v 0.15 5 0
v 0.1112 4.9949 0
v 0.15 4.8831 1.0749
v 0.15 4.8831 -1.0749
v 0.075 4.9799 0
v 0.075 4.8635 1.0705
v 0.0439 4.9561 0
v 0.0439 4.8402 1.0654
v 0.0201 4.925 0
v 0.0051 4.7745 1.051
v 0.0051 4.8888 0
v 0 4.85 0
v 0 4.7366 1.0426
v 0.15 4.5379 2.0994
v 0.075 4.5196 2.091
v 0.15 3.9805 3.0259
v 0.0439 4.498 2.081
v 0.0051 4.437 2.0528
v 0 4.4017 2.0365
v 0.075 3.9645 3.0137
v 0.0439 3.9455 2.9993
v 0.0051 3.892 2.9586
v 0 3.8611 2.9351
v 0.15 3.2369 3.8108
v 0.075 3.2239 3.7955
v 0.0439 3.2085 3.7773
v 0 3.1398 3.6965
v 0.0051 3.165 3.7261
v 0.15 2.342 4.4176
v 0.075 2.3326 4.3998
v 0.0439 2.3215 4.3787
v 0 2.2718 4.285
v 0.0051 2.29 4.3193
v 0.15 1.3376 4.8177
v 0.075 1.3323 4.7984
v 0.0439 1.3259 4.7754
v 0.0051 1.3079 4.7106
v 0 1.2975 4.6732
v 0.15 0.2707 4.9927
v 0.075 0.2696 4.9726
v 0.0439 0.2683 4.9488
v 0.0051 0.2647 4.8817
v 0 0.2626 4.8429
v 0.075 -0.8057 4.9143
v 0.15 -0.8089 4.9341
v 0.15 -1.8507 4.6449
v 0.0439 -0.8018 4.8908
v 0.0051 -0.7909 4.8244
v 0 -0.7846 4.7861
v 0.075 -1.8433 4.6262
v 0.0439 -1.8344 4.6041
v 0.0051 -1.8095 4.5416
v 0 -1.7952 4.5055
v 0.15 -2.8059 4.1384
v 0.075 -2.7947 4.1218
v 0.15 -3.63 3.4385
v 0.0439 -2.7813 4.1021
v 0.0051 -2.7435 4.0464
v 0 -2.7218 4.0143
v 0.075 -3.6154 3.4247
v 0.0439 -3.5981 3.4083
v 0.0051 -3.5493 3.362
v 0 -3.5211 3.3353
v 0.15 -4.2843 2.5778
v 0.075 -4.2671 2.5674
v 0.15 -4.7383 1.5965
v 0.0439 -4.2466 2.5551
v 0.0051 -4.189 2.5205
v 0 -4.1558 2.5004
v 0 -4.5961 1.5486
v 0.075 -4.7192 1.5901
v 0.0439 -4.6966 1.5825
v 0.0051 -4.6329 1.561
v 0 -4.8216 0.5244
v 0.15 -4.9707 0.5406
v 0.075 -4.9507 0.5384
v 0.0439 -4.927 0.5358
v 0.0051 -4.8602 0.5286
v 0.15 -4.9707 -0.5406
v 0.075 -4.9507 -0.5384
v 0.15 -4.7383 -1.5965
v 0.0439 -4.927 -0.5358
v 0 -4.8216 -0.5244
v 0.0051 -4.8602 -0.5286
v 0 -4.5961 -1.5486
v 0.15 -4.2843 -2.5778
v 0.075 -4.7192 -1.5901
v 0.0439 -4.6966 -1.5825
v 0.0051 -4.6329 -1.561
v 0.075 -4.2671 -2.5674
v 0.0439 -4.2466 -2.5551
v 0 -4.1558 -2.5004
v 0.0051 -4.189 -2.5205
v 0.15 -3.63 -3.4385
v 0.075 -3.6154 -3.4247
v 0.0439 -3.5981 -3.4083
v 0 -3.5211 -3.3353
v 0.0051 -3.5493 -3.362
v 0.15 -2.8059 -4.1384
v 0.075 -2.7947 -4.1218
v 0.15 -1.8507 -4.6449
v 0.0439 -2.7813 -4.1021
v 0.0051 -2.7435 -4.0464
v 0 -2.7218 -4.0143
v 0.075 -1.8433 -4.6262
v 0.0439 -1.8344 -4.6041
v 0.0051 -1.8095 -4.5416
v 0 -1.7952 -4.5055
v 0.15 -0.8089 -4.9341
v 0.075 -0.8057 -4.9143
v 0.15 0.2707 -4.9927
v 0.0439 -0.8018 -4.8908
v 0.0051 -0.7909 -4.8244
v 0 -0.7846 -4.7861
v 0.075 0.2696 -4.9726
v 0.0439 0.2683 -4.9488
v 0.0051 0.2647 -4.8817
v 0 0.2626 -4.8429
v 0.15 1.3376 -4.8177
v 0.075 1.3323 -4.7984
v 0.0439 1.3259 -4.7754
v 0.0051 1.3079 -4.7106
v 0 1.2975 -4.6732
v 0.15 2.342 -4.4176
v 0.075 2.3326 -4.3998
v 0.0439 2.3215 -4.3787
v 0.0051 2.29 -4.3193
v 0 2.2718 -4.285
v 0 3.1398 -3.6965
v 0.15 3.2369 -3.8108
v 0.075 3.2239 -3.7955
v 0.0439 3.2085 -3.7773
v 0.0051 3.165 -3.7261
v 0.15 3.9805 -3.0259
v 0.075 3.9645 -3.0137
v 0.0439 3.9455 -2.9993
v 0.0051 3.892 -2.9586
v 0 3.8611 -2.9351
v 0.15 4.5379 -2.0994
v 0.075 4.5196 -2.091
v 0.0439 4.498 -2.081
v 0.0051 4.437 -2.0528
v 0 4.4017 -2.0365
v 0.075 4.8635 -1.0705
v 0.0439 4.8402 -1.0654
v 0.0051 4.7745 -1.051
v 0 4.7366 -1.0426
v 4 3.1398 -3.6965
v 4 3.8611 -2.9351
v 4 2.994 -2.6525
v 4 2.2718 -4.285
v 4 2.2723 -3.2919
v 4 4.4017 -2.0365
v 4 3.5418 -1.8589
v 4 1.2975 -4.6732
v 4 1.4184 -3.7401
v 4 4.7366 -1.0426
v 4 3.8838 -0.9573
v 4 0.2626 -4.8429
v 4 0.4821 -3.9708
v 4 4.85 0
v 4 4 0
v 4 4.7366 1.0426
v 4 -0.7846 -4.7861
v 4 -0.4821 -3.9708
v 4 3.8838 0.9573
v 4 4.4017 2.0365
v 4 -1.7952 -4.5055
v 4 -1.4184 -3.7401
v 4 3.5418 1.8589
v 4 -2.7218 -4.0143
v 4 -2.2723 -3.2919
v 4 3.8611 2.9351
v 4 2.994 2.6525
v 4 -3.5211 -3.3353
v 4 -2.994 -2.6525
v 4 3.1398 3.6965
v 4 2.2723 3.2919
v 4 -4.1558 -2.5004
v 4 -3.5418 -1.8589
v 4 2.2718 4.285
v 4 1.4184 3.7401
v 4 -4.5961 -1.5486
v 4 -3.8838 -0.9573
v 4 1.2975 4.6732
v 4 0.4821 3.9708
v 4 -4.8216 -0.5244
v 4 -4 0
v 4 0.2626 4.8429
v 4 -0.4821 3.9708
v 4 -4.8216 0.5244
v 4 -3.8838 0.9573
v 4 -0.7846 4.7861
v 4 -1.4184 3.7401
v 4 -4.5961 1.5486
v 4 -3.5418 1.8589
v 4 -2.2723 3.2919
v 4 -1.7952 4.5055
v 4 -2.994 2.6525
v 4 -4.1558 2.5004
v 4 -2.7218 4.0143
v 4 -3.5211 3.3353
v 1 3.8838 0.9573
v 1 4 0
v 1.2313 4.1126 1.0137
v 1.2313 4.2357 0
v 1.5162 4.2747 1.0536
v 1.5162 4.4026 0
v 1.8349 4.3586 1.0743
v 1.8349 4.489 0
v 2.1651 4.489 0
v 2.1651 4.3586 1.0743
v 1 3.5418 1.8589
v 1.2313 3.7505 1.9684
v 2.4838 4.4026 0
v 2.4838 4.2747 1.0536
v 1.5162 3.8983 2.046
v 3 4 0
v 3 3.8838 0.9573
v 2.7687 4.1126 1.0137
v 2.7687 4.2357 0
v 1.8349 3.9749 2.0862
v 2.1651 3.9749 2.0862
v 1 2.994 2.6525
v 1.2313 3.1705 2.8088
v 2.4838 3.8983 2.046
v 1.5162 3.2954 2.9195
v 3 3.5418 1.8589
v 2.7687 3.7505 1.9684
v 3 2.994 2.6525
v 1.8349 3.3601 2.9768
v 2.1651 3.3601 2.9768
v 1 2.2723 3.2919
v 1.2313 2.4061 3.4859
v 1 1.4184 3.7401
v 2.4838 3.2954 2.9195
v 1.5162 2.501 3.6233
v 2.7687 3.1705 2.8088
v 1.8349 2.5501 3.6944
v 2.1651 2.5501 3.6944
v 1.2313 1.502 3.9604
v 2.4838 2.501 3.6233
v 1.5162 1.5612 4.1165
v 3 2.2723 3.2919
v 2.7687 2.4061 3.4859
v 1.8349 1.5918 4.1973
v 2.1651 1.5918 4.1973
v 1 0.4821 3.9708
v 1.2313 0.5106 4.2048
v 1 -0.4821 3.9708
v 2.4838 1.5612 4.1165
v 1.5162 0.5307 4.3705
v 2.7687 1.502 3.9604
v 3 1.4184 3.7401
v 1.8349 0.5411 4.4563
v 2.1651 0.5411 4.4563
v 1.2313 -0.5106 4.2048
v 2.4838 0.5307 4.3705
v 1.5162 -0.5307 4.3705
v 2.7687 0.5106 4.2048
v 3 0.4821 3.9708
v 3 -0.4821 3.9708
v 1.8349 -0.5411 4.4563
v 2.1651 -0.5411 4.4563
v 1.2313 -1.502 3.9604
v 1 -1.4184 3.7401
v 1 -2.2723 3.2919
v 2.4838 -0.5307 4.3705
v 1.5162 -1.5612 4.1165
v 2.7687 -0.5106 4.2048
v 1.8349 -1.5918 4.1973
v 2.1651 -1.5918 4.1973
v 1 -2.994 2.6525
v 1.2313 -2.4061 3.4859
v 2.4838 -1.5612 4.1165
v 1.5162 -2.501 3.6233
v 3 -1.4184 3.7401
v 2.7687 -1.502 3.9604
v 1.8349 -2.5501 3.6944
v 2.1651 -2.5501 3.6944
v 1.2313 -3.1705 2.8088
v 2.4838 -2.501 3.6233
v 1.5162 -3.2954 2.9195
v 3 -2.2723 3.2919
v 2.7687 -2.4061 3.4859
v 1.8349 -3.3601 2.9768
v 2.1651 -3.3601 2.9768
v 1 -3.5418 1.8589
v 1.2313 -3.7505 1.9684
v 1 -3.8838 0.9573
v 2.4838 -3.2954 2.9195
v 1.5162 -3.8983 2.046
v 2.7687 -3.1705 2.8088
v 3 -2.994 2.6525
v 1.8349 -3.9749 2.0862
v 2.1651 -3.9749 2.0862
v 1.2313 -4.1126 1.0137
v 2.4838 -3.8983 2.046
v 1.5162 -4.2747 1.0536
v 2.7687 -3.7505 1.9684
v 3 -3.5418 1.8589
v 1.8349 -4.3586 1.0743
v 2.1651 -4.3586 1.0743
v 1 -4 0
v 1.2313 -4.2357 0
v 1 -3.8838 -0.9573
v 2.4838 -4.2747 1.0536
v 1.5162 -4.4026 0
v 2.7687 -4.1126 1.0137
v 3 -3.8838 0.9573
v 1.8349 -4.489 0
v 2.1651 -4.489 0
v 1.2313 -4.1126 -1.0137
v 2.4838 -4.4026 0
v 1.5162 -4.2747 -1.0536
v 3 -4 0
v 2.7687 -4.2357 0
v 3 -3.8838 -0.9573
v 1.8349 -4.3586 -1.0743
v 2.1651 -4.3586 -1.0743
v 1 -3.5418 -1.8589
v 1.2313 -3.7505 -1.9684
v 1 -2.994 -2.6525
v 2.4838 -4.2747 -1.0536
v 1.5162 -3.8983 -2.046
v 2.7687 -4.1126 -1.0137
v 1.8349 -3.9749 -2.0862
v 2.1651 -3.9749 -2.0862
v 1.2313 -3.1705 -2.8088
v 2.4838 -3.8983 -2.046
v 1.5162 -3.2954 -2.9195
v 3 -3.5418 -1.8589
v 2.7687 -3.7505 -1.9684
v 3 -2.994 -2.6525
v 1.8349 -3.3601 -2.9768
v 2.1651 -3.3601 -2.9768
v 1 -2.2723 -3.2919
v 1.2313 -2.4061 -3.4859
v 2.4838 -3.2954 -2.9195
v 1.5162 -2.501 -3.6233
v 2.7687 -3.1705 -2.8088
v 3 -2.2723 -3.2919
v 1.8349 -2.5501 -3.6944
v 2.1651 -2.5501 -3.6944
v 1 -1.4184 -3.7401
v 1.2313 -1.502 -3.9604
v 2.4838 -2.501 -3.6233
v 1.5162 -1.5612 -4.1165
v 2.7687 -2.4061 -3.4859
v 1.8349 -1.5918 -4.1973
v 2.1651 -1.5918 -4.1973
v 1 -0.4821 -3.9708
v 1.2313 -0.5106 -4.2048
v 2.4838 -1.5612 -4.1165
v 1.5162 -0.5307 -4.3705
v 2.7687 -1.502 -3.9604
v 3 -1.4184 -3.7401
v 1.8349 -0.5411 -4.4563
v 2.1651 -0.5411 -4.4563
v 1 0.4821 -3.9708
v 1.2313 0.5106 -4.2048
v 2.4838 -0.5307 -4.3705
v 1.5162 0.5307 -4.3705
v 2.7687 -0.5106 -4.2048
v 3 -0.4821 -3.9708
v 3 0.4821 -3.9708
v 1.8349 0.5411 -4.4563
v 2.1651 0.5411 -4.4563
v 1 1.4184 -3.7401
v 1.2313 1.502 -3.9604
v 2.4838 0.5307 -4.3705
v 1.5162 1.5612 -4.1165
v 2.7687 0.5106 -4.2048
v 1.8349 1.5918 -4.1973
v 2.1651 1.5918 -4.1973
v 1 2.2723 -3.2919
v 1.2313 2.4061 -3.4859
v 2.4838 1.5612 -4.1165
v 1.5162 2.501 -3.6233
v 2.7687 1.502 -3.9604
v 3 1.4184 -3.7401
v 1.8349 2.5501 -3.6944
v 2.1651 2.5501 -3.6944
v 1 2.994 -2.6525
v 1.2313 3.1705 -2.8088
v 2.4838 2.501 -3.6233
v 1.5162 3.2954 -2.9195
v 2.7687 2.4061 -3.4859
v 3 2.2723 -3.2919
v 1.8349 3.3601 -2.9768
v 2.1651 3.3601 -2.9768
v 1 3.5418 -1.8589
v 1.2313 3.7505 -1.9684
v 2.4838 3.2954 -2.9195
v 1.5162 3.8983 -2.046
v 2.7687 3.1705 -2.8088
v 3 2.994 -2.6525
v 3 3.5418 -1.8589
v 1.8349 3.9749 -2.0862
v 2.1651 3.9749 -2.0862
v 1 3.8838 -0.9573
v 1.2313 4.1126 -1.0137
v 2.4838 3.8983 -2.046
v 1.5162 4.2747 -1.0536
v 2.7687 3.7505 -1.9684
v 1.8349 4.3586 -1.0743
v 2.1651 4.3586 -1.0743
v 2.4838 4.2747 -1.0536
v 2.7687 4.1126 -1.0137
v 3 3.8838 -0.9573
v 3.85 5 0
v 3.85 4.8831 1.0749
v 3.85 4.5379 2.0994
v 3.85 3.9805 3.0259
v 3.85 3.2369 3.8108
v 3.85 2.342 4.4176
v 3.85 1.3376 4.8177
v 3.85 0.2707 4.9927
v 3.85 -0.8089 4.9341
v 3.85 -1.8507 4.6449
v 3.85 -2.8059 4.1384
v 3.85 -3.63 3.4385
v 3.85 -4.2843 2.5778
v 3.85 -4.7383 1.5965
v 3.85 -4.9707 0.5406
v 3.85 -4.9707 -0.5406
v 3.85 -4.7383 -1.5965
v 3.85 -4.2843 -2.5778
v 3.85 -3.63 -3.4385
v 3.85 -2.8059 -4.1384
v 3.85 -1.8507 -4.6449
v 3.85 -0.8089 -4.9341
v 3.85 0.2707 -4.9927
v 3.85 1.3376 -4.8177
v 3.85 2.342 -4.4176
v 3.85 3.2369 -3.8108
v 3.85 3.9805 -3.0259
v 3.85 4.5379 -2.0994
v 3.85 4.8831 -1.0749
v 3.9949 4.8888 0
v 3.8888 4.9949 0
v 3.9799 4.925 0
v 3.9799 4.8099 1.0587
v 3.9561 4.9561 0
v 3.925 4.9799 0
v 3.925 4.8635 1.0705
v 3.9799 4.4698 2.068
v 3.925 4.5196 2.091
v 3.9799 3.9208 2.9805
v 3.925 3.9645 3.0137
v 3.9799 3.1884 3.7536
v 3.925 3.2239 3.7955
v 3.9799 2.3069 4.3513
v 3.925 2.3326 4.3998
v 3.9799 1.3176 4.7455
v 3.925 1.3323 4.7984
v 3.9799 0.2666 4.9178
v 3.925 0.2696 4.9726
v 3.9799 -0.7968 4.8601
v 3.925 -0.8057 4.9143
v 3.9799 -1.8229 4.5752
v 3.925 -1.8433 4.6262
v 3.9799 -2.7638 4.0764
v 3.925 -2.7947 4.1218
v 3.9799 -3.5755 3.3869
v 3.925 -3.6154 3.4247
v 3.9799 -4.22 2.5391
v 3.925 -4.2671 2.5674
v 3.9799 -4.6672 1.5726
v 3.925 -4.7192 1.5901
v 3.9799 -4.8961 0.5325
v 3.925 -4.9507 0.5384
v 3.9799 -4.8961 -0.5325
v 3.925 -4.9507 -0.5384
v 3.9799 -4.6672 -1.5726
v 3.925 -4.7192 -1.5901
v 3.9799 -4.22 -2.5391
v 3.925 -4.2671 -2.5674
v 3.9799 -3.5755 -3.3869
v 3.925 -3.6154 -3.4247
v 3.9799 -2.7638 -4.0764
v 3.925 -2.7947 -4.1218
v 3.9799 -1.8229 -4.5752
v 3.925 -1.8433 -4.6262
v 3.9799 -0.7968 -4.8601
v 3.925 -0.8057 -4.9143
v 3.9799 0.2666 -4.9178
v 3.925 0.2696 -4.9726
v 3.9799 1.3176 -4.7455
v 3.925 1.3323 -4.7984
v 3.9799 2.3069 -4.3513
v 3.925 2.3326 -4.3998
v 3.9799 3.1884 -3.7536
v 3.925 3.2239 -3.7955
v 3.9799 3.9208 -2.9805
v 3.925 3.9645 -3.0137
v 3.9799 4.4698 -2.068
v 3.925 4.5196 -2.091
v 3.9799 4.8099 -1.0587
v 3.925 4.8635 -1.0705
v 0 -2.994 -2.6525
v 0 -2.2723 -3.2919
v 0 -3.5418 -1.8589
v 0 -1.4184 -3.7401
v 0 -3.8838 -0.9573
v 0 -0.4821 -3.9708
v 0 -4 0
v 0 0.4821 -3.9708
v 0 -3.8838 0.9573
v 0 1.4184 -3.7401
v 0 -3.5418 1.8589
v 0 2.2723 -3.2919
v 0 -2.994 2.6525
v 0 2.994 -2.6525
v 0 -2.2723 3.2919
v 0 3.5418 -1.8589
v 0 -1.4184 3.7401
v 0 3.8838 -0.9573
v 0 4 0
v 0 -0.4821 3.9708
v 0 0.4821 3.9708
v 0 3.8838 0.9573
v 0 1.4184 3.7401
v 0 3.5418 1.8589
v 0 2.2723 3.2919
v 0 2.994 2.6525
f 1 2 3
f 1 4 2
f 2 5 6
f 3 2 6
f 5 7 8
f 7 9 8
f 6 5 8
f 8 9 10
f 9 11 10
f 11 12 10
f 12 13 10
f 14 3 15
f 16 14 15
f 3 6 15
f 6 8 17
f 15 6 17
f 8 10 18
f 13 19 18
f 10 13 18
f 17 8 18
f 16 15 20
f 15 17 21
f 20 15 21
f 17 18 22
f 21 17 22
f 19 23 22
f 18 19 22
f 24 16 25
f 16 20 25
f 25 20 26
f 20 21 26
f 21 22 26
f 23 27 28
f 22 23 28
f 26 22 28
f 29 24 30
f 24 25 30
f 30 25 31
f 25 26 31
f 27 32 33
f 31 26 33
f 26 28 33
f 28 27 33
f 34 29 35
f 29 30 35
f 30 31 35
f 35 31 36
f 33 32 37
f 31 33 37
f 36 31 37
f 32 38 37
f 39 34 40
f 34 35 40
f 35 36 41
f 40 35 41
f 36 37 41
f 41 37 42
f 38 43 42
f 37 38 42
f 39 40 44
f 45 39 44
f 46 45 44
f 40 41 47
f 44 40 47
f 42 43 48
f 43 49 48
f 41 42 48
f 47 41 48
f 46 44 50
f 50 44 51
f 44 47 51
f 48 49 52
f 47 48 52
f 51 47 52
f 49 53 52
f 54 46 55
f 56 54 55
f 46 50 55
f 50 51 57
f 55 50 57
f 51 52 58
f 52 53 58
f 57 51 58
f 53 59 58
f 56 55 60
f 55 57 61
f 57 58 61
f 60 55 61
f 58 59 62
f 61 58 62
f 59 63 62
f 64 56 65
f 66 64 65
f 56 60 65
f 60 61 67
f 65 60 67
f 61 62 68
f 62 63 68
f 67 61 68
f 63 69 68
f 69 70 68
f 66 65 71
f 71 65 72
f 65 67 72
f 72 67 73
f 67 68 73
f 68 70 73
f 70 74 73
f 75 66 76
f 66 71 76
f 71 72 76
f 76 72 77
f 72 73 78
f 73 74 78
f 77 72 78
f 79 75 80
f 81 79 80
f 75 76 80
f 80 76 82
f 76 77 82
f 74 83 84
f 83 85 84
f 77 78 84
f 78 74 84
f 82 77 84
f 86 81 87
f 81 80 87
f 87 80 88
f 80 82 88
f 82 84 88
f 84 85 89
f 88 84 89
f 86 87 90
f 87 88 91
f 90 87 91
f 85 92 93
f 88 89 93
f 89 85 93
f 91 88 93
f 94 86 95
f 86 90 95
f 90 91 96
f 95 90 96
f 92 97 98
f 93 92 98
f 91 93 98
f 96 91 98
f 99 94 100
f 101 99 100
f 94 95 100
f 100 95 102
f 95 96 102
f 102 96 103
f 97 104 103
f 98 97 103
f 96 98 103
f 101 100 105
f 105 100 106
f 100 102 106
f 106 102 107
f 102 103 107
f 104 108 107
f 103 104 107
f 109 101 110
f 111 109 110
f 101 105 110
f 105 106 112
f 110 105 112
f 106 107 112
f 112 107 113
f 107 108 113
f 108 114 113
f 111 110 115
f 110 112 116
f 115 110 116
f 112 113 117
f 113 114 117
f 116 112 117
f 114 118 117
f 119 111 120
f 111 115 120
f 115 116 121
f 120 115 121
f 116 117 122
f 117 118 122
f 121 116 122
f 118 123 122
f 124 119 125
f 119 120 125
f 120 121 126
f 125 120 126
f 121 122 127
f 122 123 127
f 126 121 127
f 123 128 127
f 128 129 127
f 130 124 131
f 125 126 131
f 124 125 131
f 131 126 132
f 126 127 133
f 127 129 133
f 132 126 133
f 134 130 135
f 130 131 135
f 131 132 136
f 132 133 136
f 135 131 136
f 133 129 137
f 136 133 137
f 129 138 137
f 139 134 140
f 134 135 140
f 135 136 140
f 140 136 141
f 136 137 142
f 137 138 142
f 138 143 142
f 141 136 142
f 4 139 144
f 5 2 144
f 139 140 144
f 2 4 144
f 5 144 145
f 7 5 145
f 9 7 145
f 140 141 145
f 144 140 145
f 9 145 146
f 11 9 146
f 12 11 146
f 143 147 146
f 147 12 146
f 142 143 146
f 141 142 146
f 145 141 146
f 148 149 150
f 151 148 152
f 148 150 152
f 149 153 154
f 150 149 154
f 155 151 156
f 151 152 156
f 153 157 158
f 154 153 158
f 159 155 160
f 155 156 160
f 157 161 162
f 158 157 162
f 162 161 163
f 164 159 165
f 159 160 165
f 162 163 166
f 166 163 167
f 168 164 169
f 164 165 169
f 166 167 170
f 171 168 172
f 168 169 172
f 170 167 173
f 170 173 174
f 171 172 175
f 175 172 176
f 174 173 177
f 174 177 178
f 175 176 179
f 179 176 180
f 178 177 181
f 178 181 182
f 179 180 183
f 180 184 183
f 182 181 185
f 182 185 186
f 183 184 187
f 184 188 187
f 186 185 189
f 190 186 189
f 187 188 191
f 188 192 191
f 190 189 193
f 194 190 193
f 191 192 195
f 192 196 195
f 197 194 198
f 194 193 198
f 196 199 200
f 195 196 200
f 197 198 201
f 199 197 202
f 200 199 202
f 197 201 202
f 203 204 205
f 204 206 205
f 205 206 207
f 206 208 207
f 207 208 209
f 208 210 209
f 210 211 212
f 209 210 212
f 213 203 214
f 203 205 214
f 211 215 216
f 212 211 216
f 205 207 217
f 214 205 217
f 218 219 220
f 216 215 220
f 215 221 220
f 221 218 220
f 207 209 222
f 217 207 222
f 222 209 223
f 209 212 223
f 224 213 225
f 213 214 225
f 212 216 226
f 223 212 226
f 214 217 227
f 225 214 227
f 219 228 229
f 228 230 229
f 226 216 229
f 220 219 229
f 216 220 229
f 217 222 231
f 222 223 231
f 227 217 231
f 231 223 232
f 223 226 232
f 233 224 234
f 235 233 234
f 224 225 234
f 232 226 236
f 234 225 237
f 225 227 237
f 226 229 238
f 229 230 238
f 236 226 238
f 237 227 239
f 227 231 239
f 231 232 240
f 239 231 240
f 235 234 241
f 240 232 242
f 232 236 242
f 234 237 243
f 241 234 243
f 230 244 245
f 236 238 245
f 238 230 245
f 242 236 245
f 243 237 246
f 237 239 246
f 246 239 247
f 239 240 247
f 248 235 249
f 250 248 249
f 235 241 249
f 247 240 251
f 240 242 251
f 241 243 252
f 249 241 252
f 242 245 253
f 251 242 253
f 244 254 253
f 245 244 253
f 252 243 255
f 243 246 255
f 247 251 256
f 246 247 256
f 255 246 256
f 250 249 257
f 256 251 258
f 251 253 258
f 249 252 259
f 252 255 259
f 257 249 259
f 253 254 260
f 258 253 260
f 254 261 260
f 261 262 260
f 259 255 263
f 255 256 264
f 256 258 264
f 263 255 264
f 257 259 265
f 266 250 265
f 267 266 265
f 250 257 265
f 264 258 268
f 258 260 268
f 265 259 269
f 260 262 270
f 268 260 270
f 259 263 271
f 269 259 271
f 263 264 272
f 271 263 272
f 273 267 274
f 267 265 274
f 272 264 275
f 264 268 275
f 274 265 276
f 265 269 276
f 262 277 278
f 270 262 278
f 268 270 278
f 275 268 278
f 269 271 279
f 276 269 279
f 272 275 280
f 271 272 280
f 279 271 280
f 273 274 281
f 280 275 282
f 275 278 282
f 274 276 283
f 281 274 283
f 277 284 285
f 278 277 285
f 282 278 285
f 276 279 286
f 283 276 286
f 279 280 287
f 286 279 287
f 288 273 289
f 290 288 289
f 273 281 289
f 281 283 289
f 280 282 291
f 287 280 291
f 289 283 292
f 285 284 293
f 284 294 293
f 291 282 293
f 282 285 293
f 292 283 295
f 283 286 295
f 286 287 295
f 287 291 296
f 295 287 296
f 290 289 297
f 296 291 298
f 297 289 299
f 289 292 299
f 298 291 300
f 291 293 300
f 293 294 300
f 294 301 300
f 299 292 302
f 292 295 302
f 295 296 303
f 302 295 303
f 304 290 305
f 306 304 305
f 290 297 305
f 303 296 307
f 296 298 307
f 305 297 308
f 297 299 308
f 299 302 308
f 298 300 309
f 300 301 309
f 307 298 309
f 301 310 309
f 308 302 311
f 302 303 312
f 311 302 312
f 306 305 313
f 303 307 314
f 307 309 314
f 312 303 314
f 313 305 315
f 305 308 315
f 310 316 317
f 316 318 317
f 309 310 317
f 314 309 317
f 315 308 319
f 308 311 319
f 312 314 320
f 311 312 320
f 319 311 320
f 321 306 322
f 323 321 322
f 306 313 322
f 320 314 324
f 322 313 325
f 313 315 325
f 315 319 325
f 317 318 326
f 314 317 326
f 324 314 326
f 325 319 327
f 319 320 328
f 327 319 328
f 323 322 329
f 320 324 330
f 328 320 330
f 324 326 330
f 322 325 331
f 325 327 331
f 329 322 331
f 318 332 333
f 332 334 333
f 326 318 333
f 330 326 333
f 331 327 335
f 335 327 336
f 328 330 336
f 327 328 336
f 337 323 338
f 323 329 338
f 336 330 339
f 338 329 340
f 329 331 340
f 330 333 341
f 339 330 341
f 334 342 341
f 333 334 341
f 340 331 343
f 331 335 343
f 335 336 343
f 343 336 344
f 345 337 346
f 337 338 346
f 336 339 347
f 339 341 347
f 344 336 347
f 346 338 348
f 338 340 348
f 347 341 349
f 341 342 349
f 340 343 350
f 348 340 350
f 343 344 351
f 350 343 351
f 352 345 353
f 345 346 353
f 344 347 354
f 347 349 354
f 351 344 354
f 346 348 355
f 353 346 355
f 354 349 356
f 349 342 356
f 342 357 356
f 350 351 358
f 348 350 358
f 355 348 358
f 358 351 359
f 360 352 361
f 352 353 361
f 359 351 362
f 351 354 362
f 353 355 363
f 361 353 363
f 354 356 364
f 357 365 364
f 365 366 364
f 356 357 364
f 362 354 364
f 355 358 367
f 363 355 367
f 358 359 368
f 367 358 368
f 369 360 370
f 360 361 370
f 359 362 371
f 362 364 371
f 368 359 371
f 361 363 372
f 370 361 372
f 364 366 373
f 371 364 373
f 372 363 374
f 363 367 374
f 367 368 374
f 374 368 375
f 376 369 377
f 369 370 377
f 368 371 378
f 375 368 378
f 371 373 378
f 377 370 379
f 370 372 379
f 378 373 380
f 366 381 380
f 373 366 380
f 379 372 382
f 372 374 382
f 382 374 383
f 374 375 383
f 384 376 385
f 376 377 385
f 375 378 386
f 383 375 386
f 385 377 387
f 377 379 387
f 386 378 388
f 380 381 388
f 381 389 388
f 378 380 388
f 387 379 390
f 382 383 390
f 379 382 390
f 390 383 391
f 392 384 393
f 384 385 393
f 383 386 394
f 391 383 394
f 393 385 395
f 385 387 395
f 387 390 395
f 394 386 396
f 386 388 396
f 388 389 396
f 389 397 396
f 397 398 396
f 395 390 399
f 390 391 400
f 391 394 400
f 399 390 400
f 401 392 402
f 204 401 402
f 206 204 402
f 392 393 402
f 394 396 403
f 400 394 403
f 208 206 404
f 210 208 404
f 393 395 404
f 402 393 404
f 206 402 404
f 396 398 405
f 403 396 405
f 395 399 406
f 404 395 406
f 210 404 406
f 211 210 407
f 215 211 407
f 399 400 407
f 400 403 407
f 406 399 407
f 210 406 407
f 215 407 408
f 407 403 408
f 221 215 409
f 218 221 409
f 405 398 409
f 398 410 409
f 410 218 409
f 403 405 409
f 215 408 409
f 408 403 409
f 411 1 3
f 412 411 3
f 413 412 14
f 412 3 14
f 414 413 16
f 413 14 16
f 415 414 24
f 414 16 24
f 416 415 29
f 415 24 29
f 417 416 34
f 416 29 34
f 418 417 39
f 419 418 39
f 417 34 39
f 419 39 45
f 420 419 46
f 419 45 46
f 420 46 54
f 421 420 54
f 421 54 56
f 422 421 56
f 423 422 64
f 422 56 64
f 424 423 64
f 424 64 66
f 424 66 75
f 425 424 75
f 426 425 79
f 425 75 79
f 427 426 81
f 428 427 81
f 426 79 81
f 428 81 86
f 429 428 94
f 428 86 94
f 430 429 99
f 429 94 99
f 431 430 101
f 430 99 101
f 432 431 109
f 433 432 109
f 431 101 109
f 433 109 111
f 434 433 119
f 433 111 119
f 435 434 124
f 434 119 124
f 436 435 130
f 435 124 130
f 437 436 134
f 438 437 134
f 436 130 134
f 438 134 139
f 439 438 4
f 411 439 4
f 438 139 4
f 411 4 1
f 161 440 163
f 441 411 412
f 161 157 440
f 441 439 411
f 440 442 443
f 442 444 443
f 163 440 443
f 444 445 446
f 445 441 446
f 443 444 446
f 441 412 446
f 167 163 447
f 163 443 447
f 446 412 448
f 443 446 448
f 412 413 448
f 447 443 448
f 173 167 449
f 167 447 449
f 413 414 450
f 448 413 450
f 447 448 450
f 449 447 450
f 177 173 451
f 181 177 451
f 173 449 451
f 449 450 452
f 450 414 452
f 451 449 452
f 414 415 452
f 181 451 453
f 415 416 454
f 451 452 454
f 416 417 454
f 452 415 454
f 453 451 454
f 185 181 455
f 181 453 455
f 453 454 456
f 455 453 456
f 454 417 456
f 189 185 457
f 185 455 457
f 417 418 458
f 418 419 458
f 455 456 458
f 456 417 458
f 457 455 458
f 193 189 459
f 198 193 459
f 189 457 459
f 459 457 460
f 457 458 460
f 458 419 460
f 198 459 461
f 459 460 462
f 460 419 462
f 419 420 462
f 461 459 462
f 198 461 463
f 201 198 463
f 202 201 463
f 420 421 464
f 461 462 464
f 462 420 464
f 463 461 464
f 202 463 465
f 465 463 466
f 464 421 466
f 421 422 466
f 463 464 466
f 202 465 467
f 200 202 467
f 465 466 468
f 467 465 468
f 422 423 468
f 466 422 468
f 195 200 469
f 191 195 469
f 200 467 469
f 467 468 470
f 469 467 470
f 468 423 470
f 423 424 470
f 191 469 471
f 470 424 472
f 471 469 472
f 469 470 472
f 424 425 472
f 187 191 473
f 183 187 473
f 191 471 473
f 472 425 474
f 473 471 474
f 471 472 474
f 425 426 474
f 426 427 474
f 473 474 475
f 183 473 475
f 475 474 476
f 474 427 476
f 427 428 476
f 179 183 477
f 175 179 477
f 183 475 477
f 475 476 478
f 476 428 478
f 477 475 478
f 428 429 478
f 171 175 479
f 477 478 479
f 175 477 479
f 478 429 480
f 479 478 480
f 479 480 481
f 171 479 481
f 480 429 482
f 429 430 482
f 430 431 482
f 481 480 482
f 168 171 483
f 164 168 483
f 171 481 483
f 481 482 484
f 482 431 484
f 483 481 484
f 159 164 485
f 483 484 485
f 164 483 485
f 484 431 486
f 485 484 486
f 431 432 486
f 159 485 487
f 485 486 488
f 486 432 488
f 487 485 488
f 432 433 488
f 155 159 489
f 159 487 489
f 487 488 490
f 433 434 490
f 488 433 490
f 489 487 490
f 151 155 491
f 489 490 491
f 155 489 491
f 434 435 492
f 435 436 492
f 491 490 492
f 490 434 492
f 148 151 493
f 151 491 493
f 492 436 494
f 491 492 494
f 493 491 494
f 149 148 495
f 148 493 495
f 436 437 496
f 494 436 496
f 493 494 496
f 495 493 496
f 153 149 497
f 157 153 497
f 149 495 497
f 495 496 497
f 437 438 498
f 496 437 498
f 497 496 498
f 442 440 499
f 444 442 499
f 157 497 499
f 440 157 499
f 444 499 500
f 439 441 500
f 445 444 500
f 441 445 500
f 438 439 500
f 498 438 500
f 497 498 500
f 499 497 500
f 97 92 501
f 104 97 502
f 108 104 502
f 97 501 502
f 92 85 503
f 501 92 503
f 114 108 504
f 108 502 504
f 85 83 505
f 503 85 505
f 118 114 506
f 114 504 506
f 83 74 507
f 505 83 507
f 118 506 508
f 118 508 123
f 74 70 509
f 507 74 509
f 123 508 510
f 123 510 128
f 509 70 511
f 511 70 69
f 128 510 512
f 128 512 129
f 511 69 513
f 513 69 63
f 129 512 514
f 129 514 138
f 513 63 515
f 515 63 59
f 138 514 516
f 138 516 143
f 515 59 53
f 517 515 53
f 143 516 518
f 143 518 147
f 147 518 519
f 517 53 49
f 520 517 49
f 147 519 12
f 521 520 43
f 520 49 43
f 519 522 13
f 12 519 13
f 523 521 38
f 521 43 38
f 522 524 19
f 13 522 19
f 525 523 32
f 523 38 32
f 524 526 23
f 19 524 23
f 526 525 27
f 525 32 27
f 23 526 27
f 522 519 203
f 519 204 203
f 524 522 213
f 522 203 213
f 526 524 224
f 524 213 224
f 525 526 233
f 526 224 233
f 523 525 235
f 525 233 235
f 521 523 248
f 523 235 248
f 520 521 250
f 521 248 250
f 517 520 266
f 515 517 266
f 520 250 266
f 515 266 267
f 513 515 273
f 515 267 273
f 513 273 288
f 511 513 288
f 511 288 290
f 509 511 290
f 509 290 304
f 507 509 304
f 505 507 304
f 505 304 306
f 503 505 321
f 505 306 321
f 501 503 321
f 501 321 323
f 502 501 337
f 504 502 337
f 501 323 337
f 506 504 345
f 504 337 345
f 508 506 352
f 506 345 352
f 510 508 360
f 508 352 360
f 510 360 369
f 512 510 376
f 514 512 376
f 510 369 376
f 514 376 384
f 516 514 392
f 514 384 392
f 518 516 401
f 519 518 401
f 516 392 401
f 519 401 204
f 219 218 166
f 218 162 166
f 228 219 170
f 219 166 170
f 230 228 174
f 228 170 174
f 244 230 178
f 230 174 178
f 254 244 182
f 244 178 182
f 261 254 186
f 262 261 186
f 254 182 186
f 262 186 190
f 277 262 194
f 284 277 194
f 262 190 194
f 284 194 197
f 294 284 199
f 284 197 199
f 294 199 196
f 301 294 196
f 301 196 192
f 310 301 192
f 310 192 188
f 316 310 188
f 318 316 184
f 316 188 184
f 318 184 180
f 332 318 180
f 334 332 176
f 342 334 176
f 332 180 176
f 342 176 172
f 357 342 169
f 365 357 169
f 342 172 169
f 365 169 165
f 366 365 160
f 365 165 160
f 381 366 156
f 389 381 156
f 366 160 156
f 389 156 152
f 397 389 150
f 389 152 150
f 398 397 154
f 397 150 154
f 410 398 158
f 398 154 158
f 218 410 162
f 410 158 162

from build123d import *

# Parameters (mm, degrees)
CONG_1_R = 0.15


with BuildPart() as part:
    # Esquisse1 → Base-Révolution (revolve)
    with BuildSketch(Plane.XY):
        with BuildLine():
            Line((0, 4), (1, 4))
            ThreePointArc((1, 4), (2, 4.5), (3, 4))
            Line((3, 4), (4, 4))
            Line((4, 4), (4, 5))
            Line((4, 5), (0, 5))
            Line((0, 5), (0, 4))
        make_face()
    revolve(axis=Axis((0, 0, 0), (1, 0, 0)))

    # Congé1
    cong_1_edges = [part.edges().sort_by_distance(p)[0] for p in [
        (4, -5, 0),
        (0, -5, 0),
    ]]
    fillet(cong_1_edges, radius=CONG_1_R)


solid = part.part
